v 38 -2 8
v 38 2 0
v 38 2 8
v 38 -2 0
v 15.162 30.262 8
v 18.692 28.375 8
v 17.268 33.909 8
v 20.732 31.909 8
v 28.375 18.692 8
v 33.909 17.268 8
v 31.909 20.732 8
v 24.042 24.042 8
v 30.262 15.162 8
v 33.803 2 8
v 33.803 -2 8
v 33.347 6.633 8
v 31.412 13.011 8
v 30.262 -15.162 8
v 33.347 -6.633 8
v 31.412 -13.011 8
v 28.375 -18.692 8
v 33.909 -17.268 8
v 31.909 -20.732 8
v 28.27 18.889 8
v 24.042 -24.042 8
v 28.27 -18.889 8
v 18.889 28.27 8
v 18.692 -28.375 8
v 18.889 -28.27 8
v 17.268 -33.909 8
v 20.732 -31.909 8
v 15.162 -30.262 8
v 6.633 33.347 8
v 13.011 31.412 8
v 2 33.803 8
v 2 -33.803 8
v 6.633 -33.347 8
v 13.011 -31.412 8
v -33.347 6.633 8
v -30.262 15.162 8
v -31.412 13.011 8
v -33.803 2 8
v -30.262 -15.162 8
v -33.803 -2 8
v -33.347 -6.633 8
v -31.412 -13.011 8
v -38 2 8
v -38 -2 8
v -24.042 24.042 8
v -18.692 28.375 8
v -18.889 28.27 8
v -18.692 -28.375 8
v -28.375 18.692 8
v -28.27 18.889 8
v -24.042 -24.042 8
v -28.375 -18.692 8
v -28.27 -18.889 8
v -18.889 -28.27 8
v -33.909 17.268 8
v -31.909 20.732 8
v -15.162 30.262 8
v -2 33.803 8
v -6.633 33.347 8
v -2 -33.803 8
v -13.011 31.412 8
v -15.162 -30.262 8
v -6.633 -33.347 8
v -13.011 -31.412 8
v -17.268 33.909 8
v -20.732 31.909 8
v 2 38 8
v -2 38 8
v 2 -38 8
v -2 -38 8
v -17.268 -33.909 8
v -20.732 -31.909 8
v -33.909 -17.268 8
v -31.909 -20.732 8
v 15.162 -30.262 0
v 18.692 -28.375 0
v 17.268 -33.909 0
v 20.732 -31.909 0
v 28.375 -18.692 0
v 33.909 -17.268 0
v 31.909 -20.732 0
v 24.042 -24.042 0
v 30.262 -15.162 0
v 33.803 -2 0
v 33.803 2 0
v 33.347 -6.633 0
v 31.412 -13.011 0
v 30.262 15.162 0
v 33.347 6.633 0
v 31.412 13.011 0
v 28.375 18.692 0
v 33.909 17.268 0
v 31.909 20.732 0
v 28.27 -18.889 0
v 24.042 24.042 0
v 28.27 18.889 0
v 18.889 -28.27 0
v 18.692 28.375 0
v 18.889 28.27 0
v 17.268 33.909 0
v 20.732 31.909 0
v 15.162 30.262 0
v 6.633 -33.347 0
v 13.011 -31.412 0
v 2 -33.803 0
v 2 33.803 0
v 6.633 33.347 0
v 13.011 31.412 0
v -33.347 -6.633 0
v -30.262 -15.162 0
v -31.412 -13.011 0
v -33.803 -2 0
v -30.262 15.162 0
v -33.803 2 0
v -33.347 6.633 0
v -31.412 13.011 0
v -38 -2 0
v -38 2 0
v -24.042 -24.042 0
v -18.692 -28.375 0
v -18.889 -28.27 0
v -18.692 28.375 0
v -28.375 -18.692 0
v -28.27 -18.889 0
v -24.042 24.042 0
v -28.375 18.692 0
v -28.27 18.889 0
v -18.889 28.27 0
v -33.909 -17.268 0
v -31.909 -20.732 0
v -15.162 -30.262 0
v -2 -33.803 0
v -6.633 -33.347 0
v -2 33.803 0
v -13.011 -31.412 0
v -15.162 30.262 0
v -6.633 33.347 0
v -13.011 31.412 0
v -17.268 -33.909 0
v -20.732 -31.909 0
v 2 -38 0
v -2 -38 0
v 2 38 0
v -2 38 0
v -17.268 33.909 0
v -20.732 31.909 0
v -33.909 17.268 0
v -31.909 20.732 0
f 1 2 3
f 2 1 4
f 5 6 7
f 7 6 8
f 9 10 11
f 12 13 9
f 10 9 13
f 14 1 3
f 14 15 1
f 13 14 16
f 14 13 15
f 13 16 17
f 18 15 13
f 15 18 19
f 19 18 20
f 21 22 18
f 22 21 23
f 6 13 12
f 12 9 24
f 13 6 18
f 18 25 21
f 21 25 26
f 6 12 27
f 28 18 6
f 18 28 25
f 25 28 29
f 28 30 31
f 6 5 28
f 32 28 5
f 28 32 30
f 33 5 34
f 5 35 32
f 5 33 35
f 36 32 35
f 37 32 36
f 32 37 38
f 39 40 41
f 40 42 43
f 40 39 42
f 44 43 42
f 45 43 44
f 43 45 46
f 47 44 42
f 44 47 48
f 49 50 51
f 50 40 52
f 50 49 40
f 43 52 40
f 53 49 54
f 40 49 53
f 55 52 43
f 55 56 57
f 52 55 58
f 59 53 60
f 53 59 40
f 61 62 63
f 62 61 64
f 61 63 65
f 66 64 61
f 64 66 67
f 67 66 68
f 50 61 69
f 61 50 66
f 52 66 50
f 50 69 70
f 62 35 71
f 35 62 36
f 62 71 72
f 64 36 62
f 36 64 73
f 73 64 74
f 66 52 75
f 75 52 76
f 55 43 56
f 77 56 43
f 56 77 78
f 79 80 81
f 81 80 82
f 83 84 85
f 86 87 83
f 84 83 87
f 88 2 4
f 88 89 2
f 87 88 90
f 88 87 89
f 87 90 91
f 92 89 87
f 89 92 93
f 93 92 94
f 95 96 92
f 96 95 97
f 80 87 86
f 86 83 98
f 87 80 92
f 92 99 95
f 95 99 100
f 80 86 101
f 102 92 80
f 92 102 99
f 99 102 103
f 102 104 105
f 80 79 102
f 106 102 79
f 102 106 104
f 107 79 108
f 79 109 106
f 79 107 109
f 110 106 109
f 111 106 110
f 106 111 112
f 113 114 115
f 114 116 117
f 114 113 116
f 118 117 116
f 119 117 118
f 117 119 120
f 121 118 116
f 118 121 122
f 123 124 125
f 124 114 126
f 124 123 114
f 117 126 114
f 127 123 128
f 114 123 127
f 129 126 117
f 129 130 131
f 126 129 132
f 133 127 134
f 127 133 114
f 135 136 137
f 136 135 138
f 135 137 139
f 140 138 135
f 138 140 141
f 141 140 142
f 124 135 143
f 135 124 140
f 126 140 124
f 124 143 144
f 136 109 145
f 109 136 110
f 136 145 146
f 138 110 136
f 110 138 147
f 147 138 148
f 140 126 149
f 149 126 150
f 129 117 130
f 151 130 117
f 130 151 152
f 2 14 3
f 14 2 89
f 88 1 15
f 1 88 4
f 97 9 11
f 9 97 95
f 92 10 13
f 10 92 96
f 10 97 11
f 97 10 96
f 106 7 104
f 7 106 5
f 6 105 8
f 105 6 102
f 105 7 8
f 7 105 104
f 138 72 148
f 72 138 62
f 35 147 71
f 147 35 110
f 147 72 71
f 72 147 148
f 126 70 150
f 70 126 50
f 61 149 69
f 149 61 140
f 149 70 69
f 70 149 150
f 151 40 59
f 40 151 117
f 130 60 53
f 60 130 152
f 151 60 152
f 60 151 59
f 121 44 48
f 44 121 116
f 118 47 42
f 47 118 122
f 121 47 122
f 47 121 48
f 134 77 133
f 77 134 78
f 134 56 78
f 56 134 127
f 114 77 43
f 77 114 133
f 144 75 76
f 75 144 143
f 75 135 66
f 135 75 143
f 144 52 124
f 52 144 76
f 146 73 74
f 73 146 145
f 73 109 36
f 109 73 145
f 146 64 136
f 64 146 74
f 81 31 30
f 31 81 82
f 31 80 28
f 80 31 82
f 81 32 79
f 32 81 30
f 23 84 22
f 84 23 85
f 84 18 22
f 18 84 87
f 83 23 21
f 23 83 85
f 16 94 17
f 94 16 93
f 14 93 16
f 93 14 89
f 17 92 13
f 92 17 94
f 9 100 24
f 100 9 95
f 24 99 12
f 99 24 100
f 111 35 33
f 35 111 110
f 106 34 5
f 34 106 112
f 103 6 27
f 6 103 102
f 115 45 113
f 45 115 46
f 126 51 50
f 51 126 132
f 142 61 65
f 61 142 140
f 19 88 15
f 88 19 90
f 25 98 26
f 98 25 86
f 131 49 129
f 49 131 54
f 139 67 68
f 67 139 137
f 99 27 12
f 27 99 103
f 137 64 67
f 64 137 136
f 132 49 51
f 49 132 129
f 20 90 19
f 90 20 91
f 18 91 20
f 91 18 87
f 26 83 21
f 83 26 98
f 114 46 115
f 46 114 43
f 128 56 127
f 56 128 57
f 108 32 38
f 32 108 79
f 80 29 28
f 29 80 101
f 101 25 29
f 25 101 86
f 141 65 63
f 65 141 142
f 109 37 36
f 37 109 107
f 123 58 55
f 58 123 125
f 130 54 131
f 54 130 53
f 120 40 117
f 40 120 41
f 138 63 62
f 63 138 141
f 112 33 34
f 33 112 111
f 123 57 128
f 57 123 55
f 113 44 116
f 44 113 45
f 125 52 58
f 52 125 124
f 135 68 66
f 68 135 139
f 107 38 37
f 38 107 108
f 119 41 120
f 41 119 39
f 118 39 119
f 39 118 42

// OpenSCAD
$fn = 32;

// ----------------------------------------------------------------------
// Spur blank: plain gear blank
// ----------------------------------------------------------------------

// --- parameters (mm) ---
disc_r = 34;              // blank root radius
disc_t = 8;               // blank thickness
n_teeth = 12;             // stub tooth count
tooth_w = 4;              // tooth width at the root
tooth_h = 4;              // tooth height above the root

out_r = disc_r + tooth_h;  // tip radius
bbox_x = 76.0;  // measured width over the teeth
bbox_y = 76.0;  // measured depth over the teeth

union() {
  cylinder(r = disc_r, h = disc_t);
  for (i = [0 : n_teeth - 1])
    rotate([0, 0, i * 360 / n_teeth])
      translate([disc_r - 1, -tooth_w / 2, 0])
        cube([tooth_h + 1, tooth_w, disc_t]);
}
